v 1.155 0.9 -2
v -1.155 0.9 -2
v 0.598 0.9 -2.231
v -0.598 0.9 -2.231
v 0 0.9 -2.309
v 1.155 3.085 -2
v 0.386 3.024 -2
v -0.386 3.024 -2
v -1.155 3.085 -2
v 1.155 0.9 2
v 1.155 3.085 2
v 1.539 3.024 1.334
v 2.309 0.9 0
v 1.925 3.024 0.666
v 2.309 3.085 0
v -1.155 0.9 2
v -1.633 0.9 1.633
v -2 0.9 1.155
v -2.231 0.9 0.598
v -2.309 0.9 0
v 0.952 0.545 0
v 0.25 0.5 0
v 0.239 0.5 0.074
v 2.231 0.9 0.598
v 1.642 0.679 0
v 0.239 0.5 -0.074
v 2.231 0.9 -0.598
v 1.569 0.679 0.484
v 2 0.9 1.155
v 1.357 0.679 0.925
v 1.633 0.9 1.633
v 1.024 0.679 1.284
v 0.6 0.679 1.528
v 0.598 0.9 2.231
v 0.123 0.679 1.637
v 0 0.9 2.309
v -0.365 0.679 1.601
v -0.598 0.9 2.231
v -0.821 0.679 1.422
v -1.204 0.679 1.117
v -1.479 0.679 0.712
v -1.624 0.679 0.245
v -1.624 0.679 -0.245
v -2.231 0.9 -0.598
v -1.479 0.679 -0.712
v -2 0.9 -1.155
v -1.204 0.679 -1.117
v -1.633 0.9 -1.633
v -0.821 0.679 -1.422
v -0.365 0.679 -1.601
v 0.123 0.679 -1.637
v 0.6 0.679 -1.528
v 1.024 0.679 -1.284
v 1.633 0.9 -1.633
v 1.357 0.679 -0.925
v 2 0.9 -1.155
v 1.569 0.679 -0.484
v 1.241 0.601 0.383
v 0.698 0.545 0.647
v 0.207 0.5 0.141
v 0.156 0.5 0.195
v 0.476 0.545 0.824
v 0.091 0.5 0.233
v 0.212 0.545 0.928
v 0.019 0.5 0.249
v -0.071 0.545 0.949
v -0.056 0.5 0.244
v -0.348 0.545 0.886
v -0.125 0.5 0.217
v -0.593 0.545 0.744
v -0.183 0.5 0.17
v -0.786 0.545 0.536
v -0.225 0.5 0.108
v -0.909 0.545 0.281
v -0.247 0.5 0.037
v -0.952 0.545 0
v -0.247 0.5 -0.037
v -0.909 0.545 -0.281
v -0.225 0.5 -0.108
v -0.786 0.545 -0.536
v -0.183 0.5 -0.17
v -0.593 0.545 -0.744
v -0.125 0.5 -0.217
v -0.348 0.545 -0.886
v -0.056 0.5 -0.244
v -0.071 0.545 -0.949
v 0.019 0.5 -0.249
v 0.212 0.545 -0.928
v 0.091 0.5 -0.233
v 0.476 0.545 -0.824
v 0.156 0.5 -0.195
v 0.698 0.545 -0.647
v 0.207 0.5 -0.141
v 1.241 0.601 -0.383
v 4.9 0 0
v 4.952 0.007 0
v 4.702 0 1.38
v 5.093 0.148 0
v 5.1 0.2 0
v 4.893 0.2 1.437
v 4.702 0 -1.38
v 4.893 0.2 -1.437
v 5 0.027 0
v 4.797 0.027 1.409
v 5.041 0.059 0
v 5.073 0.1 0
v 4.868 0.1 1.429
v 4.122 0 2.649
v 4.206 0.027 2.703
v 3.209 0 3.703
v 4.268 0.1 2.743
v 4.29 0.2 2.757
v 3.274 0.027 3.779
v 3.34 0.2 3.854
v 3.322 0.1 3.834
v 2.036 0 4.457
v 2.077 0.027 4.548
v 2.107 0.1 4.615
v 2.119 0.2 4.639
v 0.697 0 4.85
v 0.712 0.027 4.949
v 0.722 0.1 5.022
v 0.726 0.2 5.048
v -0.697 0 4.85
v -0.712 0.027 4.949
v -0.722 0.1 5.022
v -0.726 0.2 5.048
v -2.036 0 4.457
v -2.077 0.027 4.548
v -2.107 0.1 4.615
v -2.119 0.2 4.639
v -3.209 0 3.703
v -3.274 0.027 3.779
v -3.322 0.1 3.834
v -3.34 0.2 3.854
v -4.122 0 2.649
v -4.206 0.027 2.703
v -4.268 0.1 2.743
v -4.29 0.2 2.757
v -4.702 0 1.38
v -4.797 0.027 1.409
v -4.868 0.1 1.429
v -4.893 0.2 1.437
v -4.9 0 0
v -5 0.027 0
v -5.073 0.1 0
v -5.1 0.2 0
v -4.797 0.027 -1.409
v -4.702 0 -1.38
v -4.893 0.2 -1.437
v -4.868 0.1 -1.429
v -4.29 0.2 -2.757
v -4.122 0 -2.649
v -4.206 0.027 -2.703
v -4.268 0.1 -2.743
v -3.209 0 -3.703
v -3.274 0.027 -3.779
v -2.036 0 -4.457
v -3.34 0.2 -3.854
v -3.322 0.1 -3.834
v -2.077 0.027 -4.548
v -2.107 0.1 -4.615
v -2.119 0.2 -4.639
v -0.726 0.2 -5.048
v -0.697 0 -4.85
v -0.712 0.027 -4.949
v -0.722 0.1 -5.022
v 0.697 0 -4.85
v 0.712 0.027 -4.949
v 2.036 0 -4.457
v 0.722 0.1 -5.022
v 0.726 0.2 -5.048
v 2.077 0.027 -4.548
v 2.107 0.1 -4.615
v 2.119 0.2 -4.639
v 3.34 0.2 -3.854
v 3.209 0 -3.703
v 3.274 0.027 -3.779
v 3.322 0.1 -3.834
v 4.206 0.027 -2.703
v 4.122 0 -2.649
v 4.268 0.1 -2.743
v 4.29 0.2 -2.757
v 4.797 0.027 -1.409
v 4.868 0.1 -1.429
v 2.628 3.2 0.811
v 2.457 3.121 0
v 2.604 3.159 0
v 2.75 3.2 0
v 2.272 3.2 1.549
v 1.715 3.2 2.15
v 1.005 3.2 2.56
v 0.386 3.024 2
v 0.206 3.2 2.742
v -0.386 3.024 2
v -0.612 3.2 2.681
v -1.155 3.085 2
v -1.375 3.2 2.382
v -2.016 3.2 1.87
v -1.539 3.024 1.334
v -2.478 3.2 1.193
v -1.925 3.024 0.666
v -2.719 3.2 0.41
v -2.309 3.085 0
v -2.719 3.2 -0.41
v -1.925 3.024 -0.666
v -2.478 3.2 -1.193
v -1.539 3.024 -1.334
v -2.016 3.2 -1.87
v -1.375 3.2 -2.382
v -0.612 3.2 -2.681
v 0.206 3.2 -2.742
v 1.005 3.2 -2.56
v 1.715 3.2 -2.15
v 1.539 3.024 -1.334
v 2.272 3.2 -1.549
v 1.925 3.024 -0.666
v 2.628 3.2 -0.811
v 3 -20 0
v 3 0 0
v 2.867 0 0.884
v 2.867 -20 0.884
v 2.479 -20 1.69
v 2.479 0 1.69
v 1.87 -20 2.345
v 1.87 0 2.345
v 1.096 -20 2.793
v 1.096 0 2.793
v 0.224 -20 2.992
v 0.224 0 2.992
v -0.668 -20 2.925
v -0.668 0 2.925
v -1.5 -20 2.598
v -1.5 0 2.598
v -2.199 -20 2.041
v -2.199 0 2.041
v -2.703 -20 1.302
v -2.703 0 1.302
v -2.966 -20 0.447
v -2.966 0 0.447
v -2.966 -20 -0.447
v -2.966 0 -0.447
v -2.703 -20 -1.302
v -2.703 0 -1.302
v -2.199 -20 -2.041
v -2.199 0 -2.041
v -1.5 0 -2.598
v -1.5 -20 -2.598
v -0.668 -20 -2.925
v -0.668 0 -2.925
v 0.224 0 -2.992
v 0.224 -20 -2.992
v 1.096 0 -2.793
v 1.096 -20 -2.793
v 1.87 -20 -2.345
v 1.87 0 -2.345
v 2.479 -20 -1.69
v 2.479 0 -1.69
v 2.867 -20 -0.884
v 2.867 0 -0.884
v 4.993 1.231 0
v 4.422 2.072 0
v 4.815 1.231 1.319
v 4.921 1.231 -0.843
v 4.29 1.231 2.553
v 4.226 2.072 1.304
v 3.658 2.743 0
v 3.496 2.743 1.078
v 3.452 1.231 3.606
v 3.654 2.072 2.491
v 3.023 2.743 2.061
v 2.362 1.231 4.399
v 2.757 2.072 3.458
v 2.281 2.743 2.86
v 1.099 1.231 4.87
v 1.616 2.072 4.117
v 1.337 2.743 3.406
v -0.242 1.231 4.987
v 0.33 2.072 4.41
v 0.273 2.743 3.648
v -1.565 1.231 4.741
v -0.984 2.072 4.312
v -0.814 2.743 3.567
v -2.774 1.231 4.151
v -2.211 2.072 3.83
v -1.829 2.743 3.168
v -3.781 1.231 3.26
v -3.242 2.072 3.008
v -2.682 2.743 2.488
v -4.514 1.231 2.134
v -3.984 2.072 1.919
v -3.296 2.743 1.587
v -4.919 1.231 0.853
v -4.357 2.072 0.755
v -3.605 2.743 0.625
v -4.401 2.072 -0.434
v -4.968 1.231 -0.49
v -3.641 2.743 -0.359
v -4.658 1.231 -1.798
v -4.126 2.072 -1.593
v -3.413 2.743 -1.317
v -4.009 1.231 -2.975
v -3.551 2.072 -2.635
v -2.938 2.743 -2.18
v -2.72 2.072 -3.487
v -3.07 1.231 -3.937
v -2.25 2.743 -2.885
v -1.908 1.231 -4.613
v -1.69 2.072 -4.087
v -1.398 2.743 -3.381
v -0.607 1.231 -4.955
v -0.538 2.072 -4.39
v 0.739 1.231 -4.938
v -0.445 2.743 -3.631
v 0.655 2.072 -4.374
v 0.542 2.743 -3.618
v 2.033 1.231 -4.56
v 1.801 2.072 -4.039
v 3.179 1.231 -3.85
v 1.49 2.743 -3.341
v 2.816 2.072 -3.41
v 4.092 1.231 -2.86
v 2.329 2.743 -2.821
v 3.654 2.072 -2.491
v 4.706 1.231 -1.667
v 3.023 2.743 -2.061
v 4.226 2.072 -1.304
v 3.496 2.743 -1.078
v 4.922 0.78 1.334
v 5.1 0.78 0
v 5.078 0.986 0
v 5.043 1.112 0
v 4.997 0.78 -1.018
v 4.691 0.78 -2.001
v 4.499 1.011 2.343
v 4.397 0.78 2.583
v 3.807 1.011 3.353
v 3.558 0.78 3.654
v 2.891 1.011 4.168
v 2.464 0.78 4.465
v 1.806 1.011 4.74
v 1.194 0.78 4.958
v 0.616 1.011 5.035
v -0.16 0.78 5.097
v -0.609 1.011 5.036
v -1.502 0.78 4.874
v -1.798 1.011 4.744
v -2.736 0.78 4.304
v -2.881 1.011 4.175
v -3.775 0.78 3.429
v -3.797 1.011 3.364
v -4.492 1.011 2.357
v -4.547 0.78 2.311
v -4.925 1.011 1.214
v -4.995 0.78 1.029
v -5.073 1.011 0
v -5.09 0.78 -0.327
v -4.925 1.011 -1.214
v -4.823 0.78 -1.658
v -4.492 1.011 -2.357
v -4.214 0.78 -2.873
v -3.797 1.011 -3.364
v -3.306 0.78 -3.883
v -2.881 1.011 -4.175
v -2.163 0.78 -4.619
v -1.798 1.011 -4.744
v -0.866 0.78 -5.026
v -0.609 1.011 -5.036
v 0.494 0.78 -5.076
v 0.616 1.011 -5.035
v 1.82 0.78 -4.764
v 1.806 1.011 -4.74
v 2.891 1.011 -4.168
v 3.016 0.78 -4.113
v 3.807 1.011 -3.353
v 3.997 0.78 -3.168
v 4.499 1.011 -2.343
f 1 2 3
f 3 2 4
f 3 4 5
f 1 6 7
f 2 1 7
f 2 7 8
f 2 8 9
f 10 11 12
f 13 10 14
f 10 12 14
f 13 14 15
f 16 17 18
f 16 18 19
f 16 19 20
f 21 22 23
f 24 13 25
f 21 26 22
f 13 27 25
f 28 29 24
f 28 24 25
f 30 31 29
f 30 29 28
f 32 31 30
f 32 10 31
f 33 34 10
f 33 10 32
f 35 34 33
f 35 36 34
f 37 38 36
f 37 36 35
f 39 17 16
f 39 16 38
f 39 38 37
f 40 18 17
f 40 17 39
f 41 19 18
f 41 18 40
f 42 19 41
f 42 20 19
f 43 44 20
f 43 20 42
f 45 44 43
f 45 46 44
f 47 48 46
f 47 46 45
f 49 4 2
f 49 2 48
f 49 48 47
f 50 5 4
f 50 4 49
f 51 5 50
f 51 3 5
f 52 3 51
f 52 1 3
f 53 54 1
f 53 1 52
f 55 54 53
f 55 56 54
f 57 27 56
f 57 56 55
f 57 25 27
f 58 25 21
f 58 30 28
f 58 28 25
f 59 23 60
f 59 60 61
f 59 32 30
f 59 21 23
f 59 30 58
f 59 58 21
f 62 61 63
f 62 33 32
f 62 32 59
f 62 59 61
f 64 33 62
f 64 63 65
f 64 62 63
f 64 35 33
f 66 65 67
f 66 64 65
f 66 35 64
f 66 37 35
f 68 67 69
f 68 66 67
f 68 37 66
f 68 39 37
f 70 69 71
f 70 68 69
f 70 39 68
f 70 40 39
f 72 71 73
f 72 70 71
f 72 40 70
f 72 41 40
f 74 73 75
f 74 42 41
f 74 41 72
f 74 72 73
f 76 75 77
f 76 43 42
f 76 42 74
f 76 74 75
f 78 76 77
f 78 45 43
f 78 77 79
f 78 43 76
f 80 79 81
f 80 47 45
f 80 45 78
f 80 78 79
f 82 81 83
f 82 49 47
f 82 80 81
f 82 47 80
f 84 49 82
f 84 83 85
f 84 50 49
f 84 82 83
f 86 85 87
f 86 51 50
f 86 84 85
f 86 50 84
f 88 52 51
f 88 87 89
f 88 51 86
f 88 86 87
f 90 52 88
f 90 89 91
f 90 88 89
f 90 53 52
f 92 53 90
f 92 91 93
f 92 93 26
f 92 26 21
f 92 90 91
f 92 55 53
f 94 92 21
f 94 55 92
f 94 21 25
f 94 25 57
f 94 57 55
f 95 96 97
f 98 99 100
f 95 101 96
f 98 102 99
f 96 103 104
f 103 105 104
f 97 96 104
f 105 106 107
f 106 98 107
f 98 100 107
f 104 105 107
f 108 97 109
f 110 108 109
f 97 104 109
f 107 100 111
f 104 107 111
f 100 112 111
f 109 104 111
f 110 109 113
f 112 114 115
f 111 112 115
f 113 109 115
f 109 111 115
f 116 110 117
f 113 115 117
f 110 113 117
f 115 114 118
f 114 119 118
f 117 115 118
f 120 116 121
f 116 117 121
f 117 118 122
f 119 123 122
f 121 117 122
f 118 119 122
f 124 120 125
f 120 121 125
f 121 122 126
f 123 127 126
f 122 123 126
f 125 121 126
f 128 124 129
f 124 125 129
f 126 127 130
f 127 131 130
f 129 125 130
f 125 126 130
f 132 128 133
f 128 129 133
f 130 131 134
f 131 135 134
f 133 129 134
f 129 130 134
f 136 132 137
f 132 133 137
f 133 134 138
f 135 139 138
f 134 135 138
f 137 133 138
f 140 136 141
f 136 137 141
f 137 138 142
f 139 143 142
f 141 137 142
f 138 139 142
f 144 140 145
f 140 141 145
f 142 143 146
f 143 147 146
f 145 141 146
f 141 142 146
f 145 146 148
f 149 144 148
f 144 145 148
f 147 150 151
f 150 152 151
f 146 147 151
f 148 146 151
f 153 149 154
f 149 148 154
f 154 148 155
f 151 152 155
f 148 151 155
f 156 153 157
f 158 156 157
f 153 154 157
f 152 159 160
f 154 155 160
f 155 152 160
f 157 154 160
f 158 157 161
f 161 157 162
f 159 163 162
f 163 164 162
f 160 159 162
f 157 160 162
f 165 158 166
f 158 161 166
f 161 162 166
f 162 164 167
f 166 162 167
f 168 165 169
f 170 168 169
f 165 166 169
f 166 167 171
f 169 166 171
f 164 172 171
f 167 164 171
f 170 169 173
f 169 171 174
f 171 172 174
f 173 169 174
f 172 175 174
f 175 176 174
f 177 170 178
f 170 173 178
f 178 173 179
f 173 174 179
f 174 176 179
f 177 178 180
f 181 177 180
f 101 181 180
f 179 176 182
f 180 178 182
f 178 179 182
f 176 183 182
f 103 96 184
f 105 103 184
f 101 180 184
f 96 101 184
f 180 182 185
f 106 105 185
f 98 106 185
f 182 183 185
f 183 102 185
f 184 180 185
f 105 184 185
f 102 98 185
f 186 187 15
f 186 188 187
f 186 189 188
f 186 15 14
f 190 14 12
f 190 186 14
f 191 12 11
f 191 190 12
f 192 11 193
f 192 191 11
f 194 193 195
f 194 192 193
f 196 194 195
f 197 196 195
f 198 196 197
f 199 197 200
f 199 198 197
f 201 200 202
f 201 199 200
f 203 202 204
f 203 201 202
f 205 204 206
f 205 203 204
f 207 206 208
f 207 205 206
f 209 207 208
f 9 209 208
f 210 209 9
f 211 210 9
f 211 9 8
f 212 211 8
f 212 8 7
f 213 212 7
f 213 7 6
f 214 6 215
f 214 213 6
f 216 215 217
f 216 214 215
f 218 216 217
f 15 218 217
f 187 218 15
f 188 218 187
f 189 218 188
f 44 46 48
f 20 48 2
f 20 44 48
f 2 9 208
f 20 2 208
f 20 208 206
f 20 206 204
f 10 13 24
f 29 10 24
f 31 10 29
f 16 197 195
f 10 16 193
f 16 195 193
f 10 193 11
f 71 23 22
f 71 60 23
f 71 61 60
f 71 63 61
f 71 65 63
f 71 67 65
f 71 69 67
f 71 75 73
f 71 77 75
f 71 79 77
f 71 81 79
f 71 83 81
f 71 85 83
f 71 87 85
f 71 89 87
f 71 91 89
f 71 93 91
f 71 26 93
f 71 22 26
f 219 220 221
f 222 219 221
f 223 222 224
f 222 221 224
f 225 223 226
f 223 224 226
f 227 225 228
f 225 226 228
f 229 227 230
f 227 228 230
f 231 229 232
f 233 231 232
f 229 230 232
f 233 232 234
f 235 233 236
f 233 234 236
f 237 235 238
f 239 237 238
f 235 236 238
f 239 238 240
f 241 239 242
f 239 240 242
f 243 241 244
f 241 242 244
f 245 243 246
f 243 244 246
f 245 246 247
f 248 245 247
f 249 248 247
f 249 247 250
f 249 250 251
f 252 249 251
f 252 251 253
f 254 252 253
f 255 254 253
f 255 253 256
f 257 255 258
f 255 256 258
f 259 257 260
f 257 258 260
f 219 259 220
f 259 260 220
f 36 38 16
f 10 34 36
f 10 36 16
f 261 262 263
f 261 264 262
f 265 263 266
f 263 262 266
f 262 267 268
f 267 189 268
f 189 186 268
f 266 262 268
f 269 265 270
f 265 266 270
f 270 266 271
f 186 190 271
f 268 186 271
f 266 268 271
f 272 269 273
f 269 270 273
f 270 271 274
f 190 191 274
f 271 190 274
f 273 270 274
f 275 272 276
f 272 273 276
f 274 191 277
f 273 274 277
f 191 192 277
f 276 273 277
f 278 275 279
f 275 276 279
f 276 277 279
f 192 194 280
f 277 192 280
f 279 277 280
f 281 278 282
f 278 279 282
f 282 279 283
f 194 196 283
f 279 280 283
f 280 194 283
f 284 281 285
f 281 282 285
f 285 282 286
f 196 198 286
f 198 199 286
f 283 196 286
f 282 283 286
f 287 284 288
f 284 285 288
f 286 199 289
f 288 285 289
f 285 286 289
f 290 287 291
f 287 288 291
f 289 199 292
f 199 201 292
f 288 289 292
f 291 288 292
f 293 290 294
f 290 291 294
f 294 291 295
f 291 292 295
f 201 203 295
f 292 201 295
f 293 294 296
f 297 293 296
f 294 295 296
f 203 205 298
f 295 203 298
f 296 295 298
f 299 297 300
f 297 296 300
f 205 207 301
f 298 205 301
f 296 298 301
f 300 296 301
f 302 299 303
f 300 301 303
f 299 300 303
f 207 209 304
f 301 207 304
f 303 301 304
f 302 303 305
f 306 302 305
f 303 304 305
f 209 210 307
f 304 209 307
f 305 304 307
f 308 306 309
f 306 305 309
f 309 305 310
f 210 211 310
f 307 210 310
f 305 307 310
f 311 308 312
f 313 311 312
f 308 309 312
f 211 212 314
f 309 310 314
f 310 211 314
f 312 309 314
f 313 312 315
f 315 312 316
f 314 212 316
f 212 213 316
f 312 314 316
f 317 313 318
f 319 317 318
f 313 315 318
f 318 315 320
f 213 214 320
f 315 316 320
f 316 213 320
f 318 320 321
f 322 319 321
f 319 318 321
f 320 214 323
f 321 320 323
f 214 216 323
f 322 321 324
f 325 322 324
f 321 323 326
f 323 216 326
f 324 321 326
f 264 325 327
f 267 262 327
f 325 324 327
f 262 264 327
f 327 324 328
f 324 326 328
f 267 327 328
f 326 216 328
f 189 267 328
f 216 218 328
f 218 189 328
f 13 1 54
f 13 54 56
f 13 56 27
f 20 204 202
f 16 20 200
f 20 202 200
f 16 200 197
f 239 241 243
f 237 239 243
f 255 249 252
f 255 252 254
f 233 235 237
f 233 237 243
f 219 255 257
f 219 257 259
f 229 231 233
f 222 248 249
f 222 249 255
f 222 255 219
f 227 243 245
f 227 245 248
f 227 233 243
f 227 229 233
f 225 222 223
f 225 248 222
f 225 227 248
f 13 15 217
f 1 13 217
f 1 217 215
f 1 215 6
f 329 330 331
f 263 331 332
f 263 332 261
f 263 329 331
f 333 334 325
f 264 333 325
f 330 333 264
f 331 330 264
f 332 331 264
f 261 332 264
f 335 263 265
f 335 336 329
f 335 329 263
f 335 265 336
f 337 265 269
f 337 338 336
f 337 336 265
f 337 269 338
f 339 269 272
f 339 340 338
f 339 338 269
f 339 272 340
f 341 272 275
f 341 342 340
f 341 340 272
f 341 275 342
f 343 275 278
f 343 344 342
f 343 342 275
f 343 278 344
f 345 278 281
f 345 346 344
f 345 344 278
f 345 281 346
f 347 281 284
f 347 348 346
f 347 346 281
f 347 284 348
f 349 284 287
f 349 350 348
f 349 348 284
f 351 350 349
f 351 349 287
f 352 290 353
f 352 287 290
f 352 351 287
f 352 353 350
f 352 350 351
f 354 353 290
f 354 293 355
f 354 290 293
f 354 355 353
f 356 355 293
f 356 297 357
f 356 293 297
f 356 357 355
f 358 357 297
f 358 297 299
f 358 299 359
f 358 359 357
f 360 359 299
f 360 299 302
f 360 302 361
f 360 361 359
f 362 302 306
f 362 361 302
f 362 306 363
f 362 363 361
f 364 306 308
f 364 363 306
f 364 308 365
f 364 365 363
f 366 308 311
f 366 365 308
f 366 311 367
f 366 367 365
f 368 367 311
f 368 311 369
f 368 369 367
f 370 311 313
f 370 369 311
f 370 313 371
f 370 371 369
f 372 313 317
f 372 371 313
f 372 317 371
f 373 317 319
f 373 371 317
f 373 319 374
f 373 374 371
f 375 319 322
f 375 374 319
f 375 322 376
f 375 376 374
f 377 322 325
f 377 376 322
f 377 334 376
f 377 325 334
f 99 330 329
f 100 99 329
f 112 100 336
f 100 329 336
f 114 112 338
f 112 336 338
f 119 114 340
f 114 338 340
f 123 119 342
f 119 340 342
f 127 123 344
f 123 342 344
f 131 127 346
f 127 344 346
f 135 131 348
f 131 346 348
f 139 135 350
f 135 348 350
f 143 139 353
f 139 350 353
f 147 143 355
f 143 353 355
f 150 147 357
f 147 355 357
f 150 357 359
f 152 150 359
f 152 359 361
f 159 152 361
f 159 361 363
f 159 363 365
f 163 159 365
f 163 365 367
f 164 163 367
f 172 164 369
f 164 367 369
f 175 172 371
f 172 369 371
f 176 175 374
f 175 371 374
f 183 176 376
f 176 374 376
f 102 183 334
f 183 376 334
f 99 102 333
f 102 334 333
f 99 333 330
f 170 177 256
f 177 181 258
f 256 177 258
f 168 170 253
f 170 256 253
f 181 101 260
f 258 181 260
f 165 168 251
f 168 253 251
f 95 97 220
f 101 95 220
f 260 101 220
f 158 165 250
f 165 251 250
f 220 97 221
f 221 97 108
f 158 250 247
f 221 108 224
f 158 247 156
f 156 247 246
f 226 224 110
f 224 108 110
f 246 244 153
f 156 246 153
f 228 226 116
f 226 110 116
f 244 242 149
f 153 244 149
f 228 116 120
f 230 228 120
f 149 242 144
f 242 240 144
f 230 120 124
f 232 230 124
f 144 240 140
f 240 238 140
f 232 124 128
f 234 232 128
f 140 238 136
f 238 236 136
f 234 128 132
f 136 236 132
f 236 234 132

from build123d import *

# Parameters (mm, degrees)
FILLET1_R           = 0.2
FILLET2_R           = 1
SKETCH2_R           = 3
BOSS_EXTRUDE1_DEPTH = 20
CUT_EXTRUDE1_DEPTH  = 2.3


with BuildPart() as part:
    # Sketch1 → Revolve1 (revolve)
    with BuildSketch(Plane.XY):
        with BuildLine():
            Line((0, 0), (5.1, 0))
            Line((5.1, 0), (5.1, 1))
            ThreePointArc((5.1, 1), (4.1560785, 2.346833852), (2.75, 3.2))
            Line((2.75, 3.2), (0, 3.2))
            Line((0, 3.2), (0, 0))
        make_face()
    revolve(axis=Axis((0, 55, 0), (0, -1, 0)))

    # Fillet1
    fillet1_edges = [part.edges().sort_by_distance(p)[0] for p in [
        (-5.1, 0, 0),
    ]]
    fillet(fillet1_edges, radius=FILLET1_R)

    # Fillet2
    fillet2_edges = [part.edges().sort_by_distance(p)[0] for p in [
        (-5.1, 1, 0),
    ]]
    fillet(fillet2_edges, radius=FILLET2_R)

    # Sketch2 → Boss-Extrude1 (add)
    with BuildSketch(Plane.XZ):
        Circle(SKETCH2_R)
    extrude(amount=BOSS_EXTRUDE1_DEPTH)

    # Sketch6 → Revolve2 (revolve)
    with BuildSketch(Plane.XY):
        Polygon((0, 0), (0, 3.2), (2.75, 3.2), (4.9, 0), align=None)
    revolve(axis=Axis((0, 55, 0), (0, -1, 0)))

    # Sketch7 → Cut-Extrude1 (cut)
    with BuildSketch(Plane(origin=(0, 3.2, 0), x_dir=(1, 0, 0), z_dir=(0, 1, 0))):
        Polygon((1.154700538, -2), (2.309401077, 0), (1.154700538, 2), (-1.154700538, 2), (-2.309401077, 0), (-1.154700538, -2), align=None)
    extrude(amount=-CUT_EXTRUDE1_DEPTH, mode=Mode.SUBTRACT)

    # Sketch8 → Cut-Revolve1 (revolve, cut)
    with BuildSketch(Plane.XY):
        with BuildLine():
            Line((0, 0.9), (0, 0.5))
            Line((0, 0.5), (0.25, 0.5))
            ThreePointArc((0.25, 0.5), (1.298943849, 0.600925763), (2.309401077, 0.9))
            Line((2.309401077, 0.9), (0, 0.9))
        make_face()
    revolve(axis=Axis((0, 55, 0), (0, -1, 0)), mode=Mode.SUBTRACT)

    # Sketch9 → Cut-Revolve2 (revolve, cut)
    with BuildSketch(Plane.XY):
        with BuildLine():
            ThreePointArc((0, 2.814442262), (1.388448304, 2.911300775), (2.75, 3.2))
            Line((2.75, 3.2), (0, 3.2))
            Line((0, 3.2), (0, 2.814442262))
        make_face()
    revolve(axis=Axis((0, 55, 0), (0, -1, 0)), mode=Mode.SUBTRACT)


solid = part.part
